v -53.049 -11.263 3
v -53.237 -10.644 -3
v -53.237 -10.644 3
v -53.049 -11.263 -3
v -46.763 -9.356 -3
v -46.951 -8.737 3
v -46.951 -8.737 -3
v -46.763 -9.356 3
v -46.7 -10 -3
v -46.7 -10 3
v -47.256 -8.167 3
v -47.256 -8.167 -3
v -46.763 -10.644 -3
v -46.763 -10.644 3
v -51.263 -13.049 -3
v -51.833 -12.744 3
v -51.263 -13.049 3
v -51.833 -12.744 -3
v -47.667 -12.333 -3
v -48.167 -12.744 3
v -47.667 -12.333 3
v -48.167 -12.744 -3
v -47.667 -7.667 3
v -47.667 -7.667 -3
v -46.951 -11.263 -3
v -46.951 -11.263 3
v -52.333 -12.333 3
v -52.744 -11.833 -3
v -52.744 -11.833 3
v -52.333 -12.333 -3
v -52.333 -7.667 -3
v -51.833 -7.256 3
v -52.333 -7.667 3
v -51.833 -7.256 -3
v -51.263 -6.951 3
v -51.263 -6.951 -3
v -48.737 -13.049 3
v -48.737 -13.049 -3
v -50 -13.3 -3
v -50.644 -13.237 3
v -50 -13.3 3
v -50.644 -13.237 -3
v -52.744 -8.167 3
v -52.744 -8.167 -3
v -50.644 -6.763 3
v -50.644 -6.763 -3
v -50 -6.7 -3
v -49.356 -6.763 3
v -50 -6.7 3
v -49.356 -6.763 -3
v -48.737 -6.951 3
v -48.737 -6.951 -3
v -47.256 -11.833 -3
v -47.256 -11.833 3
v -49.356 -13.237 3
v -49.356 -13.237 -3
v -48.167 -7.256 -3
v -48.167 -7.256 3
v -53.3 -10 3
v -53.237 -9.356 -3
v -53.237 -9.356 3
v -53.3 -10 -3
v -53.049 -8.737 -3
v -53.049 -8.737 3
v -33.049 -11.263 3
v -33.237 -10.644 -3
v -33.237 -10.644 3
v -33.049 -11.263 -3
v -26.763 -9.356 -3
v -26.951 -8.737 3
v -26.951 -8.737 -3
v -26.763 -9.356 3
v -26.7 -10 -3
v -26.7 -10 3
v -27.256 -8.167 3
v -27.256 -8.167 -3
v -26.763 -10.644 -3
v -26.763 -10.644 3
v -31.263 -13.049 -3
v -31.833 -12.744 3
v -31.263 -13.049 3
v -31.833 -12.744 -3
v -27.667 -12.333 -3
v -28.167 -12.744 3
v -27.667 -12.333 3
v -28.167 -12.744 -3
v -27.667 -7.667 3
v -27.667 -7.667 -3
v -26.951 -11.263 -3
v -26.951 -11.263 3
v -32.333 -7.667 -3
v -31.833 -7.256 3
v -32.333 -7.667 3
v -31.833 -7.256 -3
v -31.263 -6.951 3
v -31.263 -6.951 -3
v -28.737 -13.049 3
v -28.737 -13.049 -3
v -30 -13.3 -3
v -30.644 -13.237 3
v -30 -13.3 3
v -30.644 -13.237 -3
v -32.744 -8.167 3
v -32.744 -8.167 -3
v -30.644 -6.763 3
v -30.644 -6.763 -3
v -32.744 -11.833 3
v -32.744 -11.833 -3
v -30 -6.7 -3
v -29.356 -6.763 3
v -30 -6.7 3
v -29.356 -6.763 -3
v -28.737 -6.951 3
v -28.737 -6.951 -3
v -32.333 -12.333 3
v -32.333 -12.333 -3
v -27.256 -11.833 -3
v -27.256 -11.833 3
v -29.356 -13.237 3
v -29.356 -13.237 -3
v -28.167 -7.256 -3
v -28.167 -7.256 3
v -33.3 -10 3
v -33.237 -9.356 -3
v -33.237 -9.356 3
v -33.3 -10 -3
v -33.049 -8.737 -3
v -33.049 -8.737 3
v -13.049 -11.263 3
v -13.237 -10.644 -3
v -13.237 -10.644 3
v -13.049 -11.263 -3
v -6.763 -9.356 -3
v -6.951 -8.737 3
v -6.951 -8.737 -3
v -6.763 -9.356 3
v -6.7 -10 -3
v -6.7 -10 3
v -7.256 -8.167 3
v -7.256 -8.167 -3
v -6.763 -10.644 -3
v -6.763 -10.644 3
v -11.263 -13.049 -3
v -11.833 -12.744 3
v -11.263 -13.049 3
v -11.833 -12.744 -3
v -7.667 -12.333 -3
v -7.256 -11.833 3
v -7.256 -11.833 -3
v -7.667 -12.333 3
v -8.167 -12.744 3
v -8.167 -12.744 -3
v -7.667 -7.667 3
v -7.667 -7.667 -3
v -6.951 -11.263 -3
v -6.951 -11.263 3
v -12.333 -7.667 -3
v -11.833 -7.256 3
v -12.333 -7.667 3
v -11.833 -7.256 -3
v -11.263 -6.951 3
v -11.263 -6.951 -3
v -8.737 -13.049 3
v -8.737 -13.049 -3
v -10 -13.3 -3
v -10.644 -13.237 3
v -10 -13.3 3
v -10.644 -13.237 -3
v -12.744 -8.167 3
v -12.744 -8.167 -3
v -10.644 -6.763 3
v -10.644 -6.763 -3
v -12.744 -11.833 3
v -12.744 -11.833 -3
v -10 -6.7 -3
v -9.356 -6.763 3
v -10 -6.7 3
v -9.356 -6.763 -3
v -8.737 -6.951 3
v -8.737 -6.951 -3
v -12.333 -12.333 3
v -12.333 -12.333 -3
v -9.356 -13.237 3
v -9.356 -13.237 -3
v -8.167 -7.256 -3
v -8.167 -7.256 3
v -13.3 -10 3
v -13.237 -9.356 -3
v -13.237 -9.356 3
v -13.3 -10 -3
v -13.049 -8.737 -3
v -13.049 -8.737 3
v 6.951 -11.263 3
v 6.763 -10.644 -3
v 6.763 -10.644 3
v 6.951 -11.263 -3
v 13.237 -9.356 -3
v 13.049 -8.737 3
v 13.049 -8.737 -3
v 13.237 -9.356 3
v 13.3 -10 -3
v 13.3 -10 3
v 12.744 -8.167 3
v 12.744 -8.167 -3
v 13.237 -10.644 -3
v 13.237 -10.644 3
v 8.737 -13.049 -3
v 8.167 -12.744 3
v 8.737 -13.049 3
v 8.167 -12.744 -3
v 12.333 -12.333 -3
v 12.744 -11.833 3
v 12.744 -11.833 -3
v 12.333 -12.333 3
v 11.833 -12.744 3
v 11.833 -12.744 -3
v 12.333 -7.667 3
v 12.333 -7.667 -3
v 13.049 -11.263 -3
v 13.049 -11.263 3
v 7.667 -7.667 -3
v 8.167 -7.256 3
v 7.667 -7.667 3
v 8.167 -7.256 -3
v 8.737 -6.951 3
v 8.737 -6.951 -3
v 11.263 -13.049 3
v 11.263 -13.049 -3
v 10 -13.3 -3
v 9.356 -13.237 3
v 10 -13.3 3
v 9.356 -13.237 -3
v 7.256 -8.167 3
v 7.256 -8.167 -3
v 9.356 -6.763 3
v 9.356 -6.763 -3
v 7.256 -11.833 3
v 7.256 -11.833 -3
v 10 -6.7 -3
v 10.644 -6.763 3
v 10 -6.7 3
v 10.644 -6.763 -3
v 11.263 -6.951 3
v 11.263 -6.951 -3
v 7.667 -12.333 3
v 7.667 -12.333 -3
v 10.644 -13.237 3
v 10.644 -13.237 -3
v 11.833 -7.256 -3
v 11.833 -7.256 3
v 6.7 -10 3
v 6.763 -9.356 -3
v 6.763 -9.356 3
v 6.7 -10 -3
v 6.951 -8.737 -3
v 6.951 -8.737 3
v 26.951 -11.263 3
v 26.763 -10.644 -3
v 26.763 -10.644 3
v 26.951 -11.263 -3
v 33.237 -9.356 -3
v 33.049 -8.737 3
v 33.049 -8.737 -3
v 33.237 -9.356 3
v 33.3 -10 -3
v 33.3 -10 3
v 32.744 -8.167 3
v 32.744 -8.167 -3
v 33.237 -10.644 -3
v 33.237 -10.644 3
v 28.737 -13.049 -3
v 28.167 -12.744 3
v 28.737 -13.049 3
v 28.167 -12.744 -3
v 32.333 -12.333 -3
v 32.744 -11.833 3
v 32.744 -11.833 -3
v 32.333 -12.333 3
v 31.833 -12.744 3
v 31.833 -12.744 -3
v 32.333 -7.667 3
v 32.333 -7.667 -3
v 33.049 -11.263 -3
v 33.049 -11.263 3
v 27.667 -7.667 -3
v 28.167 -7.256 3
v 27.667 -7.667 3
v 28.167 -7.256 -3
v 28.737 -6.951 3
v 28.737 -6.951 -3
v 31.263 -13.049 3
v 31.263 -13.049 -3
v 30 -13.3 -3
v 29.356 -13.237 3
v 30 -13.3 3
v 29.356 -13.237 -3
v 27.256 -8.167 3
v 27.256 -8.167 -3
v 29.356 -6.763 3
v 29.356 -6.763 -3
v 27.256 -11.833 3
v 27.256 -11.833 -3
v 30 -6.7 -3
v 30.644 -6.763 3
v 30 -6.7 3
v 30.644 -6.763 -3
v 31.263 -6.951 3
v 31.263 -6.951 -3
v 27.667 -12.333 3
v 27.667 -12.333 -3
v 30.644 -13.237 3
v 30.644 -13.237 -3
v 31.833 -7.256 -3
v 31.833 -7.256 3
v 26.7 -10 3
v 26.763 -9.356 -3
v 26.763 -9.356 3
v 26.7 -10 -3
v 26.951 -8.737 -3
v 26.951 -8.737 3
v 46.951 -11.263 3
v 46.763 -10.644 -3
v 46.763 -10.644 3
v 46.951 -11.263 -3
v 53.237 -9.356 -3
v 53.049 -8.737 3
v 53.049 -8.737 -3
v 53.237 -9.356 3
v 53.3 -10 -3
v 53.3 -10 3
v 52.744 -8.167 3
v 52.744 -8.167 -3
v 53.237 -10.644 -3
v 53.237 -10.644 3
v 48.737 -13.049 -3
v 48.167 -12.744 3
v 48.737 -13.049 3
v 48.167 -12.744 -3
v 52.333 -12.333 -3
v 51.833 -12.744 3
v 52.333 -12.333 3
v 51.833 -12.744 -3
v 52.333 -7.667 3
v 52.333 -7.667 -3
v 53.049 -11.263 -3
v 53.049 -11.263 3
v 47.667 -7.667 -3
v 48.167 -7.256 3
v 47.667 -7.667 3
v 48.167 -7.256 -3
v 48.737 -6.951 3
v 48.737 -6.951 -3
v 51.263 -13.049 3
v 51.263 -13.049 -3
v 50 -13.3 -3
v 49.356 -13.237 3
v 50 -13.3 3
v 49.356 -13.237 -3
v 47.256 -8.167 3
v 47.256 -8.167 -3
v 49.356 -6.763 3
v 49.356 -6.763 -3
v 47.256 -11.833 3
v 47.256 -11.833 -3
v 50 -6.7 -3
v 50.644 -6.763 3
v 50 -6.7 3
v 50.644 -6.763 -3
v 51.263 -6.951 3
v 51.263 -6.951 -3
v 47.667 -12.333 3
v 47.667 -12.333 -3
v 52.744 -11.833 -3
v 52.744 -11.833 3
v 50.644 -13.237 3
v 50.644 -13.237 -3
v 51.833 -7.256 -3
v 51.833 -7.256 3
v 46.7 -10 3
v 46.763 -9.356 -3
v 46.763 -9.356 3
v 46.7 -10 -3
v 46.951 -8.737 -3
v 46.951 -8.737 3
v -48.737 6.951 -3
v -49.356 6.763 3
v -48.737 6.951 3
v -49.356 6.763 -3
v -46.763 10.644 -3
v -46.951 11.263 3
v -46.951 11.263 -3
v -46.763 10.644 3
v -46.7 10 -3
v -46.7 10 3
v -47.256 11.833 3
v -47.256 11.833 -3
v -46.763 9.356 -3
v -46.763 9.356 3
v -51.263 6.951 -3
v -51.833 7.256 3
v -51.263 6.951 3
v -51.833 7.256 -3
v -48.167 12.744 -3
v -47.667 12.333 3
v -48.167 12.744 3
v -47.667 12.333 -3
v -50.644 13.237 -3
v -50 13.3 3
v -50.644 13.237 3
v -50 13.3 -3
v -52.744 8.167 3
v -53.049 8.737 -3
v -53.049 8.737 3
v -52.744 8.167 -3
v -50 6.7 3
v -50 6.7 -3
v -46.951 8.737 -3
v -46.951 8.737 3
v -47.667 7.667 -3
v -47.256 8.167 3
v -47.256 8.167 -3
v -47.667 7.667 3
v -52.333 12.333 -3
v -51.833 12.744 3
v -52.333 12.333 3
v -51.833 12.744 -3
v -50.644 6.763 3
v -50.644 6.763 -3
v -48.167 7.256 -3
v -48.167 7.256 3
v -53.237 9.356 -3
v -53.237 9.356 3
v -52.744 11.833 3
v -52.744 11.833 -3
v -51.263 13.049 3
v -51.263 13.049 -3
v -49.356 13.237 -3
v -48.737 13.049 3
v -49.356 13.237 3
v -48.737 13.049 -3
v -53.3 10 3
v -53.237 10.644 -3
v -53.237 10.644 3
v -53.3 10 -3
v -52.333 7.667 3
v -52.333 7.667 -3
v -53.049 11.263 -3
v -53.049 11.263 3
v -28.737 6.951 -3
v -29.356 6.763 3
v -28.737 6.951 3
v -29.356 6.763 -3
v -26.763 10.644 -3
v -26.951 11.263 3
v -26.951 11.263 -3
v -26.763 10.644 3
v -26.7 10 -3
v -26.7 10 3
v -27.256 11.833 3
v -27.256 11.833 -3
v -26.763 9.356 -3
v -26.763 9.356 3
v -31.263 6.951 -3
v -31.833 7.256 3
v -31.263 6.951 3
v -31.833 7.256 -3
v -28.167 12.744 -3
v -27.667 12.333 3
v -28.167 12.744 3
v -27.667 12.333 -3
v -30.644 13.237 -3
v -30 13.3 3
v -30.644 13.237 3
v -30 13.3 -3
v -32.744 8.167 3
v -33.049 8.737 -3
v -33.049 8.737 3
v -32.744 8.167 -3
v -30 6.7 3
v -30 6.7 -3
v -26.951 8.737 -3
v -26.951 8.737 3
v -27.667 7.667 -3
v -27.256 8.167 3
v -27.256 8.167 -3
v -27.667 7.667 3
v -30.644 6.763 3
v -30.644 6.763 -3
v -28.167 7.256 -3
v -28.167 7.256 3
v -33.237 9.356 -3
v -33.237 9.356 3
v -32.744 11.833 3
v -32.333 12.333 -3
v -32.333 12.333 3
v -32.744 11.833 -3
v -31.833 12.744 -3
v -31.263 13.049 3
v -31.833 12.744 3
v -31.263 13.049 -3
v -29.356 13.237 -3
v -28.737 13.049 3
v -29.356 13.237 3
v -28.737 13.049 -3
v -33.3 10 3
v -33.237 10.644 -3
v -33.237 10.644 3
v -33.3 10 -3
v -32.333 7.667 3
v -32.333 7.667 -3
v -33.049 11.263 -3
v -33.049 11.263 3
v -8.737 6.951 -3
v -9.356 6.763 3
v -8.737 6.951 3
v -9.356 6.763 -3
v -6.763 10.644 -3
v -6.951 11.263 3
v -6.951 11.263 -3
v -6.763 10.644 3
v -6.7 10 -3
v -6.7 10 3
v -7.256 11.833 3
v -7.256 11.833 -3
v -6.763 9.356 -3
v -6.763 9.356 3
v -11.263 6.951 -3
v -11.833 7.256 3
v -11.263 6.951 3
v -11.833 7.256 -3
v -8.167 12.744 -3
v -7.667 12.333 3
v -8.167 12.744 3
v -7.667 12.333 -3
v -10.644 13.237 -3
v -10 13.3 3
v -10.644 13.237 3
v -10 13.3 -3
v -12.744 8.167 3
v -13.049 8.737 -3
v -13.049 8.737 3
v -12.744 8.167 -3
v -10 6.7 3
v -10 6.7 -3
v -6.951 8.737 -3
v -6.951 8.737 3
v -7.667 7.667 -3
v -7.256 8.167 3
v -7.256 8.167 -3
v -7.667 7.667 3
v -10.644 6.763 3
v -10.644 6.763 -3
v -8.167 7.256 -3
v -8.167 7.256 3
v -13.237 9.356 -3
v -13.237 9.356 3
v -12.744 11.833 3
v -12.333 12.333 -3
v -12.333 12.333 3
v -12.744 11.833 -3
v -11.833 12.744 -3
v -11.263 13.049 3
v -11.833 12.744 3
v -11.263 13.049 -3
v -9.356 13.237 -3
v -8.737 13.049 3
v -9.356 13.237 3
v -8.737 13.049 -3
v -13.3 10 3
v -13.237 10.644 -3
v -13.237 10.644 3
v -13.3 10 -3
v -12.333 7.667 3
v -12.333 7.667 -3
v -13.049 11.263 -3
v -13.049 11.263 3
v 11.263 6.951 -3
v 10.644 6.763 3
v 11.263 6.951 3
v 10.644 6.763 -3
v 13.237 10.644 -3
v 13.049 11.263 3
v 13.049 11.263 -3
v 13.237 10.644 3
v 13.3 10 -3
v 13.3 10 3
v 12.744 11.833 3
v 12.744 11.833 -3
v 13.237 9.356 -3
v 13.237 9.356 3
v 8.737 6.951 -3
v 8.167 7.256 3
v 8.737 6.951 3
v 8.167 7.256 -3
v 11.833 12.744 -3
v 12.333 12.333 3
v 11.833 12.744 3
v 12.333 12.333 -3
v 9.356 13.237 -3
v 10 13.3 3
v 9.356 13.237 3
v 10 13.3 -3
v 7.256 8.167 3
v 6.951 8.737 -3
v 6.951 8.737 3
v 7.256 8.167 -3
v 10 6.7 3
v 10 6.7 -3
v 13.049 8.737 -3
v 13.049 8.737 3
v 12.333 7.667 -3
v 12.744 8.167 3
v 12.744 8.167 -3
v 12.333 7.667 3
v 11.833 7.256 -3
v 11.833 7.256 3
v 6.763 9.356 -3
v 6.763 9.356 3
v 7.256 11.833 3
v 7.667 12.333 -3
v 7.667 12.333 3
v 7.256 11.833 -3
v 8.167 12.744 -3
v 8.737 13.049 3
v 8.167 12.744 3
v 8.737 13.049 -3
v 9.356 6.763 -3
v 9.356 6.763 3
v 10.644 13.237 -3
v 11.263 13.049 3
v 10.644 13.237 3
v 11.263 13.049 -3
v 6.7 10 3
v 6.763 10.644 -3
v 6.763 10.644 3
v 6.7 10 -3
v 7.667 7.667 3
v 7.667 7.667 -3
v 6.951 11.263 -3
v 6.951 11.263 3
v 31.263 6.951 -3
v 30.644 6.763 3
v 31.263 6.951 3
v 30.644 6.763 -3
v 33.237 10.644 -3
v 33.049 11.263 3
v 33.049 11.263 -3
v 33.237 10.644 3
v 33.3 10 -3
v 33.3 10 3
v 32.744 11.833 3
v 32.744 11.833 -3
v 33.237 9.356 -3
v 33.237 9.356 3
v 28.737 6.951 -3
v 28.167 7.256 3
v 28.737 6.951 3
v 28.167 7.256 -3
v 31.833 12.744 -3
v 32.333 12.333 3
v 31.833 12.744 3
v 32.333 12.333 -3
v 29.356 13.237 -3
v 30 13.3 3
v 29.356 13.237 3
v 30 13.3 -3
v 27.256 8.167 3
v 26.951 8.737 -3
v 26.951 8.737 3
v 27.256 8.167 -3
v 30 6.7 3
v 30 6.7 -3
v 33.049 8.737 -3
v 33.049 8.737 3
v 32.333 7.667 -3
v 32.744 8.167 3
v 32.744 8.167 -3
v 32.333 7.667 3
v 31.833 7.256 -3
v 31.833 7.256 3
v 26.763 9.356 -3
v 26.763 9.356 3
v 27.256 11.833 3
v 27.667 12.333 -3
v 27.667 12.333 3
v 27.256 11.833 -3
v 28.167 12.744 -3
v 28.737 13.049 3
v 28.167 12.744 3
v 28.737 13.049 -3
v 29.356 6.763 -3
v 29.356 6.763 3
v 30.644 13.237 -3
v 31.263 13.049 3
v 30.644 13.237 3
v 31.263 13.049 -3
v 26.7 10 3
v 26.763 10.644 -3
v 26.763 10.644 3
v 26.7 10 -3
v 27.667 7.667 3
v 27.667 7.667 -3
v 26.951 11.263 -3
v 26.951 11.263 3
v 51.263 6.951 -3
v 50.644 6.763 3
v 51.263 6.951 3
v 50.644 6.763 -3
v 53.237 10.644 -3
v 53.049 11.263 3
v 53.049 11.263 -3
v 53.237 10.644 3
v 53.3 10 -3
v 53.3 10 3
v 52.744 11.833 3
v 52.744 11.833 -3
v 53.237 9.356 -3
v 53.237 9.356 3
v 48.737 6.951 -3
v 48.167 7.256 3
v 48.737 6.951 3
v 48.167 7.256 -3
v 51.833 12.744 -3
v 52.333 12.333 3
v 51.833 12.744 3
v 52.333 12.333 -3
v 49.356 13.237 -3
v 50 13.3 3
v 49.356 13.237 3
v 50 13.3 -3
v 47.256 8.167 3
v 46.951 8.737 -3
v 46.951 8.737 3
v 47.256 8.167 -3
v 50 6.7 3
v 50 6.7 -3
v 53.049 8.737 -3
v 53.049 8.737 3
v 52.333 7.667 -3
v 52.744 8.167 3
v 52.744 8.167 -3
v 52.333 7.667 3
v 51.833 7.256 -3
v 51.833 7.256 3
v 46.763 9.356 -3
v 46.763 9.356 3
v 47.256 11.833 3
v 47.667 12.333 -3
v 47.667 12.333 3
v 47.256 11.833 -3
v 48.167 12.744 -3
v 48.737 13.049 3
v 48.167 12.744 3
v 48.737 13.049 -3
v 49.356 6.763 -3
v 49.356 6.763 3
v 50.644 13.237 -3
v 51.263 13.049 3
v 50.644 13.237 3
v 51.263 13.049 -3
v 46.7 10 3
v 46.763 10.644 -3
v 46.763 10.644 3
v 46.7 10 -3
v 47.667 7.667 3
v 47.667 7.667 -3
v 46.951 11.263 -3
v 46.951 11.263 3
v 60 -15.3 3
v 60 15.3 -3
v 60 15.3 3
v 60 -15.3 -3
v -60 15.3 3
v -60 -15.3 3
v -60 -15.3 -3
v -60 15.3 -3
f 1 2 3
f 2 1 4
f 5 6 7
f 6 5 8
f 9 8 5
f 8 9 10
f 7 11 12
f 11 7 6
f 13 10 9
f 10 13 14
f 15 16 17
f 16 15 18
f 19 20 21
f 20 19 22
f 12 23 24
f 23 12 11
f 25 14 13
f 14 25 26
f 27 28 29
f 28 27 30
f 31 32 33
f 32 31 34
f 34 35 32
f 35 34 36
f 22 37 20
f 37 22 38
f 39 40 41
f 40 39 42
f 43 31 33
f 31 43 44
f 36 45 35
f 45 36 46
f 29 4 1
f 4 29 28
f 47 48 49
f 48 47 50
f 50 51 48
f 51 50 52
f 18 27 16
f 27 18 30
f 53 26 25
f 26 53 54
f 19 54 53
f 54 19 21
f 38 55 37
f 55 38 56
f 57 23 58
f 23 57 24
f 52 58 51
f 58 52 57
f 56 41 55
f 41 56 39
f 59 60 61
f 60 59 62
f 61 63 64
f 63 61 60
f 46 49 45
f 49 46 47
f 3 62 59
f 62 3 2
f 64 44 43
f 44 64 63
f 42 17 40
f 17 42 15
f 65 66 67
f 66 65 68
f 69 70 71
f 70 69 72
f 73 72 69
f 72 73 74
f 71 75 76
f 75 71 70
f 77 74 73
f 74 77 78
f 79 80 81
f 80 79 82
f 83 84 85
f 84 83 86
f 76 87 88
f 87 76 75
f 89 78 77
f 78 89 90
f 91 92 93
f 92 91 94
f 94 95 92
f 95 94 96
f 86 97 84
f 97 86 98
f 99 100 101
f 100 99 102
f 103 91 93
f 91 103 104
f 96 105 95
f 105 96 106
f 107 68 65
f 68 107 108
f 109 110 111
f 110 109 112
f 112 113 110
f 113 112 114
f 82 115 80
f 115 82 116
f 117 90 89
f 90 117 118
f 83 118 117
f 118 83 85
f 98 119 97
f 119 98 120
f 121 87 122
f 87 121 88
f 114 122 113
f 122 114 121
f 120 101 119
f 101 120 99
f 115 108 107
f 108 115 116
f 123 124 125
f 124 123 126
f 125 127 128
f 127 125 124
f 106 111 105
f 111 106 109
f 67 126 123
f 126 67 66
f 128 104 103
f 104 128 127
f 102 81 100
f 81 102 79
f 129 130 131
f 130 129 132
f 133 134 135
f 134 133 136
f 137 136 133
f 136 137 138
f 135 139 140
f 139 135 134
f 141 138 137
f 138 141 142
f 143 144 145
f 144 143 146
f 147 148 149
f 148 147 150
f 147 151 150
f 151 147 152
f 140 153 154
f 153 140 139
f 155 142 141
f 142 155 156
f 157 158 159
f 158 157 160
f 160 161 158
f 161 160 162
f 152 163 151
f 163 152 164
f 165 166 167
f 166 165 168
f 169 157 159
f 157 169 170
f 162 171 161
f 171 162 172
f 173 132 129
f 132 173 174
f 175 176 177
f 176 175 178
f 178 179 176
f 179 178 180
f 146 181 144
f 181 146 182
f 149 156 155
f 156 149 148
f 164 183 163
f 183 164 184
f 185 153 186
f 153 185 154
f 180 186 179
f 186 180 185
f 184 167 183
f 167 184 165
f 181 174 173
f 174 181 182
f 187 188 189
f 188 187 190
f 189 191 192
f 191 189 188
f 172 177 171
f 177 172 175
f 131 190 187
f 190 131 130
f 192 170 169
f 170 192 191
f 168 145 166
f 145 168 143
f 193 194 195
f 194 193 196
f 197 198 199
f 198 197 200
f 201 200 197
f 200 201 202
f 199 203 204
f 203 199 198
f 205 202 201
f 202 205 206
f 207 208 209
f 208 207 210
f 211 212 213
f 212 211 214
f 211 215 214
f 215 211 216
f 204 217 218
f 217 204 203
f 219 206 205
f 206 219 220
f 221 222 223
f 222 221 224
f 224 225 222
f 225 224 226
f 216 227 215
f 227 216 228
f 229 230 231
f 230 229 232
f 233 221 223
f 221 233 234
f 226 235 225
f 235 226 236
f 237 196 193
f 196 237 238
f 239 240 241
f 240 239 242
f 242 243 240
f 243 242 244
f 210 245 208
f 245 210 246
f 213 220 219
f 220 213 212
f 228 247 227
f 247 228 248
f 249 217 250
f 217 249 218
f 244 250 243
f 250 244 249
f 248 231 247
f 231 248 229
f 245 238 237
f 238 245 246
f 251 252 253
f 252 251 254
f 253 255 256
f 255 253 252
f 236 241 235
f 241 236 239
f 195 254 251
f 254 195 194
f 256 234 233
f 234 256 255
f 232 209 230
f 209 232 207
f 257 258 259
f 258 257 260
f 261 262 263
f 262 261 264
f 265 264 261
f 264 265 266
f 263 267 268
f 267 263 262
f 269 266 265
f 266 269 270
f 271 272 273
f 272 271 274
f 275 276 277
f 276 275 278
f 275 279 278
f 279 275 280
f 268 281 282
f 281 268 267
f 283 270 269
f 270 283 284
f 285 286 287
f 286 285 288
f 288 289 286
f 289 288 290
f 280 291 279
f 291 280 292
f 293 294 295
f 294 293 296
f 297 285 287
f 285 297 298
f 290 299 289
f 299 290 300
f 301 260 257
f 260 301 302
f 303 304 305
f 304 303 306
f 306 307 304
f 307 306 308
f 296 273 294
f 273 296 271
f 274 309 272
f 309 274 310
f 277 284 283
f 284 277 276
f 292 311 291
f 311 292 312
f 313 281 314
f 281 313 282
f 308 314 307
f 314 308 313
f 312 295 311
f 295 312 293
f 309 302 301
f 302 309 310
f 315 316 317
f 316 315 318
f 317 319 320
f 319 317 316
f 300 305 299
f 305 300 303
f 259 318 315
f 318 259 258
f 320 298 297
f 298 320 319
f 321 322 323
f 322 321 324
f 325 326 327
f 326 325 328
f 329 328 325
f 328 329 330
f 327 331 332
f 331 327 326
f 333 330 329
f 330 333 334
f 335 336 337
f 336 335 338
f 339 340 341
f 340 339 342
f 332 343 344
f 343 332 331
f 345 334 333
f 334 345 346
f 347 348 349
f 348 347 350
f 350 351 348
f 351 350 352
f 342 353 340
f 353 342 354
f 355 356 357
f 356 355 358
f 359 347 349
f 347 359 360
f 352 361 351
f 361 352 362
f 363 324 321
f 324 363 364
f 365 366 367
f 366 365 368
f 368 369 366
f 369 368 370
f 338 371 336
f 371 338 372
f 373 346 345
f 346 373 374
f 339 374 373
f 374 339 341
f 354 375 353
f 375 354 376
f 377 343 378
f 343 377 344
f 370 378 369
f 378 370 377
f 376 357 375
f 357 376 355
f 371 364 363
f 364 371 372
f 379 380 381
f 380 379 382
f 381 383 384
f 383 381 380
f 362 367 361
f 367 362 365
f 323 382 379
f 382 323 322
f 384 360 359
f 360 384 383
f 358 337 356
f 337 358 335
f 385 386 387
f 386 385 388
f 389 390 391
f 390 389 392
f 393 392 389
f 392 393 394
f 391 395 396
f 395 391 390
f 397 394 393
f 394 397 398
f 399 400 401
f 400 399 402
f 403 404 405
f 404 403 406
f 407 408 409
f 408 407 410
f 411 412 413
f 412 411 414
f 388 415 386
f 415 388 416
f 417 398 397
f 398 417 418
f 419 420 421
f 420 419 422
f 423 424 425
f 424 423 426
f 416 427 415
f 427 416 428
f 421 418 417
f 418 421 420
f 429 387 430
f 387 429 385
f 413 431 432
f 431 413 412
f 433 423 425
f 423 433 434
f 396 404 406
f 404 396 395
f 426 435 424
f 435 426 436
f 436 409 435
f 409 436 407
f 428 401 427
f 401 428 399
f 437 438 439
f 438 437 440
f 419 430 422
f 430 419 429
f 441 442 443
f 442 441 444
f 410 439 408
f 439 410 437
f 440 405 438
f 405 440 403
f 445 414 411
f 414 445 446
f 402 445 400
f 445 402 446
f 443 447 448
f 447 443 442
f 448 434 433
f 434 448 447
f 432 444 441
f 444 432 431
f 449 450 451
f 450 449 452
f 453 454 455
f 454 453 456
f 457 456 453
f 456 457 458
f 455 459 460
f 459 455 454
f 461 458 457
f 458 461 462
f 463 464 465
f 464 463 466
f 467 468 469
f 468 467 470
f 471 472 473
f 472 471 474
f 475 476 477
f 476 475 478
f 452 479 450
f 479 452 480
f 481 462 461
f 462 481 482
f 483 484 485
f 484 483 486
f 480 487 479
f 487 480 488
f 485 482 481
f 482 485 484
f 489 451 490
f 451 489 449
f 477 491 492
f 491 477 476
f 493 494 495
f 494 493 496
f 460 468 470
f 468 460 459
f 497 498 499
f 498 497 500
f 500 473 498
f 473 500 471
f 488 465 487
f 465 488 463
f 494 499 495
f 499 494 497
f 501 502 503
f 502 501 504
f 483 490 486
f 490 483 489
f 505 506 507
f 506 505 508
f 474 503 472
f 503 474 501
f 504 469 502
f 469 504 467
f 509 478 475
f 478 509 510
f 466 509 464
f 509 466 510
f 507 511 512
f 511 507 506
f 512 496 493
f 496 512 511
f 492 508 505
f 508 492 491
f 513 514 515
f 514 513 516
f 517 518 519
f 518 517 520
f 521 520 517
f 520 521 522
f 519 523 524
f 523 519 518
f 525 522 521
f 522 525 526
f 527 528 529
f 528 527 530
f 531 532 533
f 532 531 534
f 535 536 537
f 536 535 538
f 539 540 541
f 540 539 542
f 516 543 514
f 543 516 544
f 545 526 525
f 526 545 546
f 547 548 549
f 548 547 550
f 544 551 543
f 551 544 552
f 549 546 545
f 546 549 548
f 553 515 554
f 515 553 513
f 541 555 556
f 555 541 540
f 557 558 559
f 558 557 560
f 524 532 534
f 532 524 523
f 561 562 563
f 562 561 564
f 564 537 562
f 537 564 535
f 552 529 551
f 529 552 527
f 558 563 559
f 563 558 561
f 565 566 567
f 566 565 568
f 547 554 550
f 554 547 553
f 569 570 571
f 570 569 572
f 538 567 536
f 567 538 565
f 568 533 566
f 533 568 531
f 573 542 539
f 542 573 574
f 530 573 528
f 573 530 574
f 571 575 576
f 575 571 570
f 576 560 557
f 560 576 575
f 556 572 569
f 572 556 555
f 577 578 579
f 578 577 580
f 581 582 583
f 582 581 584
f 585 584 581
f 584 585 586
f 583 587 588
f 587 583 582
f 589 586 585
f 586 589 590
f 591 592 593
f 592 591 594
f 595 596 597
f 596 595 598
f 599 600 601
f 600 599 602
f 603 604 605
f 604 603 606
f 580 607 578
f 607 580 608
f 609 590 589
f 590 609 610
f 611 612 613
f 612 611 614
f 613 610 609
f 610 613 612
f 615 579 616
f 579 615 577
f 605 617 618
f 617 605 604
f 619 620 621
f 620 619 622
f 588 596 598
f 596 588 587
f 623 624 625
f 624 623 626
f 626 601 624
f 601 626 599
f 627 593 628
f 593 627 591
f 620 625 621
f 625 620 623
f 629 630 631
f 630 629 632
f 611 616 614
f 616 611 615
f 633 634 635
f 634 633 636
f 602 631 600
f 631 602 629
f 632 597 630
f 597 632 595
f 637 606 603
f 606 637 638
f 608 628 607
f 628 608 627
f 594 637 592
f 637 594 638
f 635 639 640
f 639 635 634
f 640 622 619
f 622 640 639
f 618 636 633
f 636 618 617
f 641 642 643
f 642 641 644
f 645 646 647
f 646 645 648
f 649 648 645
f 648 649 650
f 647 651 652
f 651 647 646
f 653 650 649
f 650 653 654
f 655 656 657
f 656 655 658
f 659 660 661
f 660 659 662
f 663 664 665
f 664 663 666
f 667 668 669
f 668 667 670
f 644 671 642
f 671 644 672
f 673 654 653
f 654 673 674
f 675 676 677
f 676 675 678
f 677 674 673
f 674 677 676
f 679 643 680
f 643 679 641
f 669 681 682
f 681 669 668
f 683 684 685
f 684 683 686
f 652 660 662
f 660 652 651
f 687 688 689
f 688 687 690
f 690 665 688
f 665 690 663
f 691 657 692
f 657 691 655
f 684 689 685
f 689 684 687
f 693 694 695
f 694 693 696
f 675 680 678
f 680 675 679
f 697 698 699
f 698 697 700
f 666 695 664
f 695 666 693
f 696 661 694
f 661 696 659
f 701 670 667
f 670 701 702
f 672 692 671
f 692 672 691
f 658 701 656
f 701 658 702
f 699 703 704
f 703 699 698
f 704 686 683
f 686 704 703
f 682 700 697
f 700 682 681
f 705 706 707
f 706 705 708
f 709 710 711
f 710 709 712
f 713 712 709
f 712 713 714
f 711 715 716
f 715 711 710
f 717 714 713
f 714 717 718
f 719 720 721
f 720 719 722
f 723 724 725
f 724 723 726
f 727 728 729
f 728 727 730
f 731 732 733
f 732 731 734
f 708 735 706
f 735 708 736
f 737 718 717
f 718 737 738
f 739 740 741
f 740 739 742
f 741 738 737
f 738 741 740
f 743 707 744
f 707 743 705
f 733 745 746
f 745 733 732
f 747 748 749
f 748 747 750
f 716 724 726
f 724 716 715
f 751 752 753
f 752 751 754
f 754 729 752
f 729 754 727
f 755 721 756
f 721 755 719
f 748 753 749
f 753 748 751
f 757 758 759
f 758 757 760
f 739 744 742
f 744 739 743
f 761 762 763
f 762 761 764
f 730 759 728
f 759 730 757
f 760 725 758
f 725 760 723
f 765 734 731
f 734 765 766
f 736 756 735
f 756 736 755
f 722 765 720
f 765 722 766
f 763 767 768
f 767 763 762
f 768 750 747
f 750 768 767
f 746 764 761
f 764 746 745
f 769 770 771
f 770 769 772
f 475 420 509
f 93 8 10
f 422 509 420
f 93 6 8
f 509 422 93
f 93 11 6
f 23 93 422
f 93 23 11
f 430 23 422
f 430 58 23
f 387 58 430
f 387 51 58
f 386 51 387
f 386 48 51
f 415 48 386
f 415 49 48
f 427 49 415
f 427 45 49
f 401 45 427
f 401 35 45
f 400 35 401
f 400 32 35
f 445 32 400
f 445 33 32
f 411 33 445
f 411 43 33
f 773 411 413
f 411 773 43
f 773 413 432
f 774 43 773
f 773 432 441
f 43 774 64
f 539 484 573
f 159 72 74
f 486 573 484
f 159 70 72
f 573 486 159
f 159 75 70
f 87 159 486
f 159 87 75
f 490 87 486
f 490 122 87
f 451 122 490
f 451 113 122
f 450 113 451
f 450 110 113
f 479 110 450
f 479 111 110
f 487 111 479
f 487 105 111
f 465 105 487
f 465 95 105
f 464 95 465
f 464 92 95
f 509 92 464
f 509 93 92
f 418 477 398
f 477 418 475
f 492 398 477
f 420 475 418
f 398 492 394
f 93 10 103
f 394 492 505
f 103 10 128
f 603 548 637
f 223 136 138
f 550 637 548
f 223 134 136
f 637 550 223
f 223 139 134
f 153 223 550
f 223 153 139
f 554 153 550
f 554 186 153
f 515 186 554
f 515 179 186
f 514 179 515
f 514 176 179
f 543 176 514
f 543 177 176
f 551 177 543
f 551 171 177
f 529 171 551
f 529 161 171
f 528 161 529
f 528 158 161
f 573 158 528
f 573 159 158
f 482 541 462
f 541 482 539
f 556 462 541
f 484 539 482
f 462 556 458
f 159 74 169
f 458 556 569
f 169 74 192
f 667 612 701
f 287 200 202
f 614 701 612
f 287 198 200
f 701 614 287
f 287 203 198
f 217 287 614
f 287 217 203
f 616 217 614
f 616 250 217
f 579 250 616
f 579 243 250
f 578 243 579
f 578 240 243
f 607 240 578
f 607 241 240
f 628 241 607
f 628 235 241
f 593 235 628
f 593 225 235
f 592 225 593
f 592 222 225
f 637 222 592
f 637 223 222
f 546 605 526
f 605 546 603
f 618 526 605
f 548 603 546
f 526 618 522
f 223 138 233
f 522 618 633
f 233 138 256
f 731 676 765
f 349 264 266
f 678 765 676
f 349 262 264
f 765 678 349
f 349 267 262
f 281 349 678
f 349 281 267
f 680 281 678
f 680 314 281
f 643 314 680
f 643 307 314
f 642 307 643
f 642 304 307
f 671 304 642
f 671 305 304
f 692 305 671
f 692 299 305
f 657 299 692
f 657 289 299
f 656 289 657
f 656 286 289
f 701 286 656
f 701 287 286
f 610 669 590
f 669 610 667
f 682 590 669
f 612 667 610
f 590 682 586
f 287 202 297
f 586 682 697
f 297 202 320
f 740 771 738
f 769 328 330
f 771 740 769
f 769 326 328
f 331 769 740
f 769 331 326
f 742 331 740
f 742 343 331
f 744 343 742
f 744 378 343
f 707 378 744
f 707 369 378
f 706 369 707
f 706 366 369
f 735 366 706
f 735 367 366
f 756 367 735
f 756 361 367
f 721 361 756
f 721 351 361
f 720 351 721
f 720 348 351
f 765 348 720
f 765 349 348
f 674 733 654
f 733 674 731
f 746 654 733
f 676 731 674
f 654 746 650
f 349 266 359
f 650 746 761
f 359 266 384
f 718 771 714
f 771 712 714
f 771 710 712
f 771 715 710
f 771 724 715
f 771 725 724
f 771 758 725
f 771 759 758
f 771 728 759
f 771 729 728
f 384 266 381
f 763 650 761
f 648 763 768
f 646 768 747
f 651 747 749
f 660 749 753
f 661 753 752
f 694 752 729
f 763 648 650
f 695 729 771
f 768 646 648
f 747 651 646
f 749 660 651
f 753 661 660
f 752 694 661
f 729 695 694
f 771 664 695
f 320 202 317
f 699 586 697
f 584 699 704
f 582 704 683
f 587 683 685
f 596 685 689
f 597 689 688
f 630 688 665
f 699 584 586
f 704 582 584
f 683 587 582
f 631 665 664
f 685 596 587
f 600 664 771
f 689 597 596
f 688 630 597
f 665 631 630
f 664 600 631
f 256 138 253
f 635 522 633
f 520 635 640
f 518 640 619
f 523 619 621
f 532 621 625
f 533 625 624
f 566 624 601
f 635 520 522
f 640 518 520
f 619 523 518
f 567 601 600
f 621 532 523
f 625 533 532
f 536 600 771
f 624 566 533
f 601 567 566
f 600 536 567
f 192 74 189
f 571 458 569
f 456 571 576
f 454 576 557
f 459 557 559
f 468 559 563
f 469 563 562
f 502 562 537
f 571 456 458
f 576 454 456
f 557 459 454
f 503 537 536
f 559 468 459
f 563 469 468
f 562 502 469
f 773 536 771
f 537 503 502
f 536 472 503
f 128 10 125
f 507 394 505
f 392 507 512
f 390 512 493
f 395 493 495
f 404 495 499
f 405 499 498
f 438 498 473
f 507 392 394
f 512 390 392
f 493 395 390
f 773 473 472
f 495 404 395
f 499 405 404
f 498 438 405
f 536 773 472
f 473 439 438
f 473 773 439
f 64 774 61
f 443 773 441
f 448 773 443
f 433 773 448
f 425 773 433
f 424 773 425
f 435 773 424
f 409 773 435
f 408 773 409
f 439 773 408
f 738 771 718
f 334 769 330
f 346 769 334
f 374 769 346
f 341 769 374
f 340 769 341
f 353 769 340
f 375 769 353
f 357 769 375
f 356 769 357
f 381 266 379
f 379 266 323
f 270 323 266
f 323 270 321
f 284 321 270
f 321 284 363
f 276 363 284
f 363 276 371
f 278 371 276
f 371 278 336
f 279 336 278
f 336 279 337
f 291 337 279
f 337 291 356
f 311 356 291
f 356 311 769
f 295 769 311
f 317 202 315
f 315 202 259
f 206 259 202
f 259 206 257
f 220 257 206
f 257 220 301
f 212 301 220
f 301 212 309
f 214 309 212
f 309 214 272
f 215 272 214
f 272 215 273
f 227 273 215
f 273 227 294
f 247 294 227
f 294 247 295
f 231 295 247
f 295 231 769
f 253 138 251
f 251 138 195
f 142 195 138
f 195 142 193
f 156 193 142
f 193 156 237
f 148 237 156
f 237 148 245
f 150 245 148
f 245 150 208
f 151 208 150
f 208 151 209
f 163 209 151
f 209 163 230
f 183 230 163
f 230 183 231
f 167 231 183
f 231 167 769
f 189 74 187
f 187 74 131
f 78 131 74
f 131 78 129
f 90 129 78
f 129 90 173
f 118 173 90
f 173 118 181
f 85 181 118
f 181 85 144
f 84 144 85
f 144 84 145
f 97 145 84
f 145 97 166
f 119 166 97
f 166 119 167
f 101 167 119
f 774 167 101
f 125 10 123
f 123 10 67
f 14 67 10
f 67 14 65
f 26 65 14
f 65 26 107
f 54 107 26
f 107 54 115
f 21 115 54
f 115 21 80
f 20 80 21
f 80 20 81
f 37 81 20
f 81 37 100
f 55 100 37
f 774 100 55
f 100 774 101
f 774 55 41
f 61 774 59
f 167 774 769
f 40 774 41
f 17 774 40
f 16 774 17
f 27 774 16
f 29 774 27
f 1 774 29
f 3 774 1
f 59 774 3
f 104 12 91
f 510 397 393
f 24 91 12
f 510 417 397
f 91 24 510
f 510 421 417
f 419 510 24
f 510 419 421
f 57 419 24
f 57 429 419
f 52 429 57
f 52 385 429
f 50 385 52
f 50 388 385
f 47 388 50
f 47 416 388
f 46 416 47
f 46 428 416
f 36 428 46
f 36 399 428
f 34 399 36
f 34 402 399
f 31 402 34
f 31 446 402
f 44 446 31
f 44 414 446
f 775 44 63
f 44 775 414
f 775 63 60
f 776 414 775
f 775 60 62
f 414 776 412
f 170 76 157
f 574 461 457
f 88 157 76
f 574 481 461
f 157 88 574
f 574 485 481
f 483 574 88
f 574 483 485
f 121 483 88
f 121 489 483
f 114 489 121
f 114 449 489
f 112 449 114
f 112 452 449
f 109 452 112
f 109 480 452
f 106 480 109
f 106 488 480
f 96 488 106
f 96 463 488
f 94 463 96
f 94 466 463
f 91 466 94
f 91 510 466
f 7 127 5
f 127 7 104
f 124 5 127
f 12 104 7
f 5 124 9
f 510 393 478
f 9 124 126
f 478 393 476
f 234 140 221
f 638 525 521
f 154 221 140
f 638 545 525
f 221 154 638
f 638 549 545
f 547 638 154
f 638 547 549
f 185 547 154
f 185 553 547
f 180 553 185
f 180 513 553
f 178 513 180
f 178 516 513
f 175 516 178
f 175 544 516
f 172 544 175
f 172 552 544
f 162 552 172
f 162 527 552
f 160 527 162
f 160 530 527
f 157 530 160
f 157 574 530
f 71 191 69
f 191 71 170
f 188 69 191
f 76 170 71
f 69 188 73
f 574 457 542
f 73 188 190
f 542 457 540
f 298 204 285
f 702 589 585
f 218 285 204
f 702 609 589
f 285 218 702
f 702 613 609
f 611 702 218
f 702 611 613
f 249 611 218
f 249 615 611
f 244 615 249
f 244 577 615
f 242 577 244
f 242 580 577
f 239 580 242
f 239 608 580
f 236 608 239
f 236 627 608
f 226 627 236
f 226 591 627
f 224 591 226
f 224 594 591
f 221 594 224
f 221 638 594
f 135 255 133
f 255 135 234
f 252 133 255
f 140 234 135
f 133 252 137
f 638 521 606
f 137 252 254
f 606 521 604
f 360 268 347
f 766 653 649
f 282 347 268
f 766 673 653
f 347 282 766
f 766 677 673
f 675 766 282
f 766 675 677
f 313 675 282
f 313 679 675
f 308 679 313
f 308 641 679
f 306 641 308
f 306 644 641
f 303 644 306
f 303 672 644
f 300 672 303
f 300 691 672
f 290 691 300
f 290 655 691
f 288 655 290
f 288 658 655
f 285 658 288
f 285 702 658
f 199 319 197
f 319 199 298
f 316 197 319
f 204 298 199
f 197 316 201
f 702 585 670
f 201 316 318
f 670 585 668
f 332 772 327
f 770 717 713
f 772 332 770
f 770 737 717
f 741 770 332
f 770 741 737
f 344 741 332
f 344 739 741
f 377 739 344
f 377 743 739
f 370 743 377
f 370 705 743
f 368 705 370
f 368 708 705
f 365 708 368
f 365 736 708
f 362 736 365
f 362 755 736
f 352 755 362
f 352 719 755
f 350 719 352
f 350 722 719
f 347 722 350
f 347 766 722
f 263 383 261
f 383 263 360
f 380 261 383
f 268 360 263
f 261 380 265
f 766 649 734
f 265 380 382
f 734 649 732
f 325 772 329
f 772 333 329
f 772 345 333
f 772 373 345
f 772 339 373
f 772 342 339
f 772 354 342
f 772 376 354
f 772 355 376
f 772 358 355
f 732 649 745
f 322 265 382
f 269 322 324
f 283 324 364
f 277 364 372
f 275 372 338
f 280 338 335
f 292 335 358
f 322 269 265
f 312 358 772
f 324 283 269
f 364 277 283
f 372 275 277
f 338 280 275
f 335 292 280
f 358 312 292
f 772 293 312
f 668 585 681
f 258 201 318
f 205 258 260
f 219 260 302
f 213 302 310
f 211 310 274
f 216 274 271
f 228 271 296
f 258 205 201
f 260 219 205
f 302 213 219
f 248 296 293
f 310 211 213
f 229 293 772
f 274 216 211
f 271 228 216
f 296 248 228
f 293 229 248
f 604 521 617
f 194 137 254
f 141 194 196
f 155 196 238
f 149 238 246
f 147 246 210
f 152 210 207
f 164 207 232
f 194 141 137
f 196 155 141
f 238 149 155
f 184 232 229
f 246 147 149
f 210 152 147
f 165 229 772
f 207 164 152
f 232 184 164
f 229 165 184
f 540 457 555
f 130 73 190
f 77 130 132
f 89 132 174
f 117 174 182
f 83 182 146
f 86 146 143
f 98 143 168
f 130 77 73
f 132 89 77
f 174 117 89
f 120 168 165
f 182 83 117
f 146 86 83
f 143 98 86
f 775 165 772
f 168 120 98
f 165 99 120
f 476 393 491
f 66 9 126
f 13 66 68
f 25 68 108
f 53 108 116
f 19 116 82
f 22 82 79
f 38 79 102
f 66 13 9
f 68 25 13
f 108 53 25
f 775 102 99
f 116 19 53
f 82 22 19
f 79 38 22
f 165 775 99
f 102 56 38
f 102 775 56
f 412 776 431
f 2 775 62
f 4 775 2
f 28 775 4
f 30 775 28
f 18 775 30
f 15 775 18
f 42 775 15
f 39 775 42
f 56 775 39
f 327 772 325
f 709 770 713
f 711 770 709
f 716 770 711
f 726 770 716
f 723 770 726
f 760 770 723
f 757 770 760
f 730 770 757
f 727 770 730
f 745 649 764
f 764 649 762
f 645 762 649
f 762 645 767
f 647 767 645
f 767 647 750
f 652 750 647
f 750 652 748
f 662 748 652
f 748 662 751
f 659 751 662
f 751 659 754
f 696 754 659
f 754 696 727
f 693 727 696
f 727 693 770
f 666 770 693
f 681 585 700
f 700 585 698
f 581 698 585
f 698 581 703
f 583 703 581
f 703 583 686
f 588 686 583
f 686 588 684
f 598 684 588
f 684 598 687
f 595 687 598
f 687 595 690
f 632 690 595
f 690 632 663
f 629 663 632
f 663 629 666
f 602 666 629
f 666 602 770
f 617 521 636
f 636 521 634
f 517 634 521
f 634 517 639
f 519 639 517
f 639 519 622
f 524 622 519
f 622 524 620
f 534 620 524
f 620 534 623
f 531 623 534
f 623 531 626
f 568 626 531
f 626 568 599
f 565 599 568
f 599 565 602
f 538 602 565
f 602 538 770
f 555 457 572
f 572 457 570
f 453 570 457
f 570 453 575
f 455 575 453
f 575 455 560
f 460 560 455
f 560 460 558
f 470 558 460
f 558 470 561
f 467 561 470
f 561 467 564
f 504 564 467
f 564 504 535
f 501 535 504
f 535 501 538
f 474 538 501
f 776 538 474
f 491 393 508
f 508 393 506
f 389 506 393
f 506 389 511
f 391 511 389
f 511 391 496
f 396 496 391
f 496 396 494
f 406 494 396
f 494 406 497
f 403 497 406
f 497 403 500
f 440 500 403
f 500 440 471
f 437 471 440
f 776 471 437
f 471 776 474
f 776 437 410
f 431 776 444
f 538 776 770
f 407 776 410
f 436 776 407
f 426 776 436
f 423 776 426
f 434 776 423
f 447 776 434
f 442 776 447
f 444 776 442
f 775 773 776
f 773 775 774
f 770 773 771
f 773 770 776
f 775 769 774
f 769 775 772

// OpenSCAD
$fn = 32;

// ----------------------------------------------------------------------
// Hole bar, 6 x Ø6.6
// tworows layout, 10 mm edge offset
// ----------------------------------------------------------------------

// --- parameters (mm) ---
bar_w = 30.6;     // bar width (Y)
bar_t = 6;        // bar thickness (Z)
holes = 6;        // holes per row
hole_d = 6.6;     // hole diameter
edge = 10;        // offset from the bar end to the first hole
pitch = 20;       // pitch between neighbouring holes
row_offset = 20;  // distance between the two rows

// --- derived feature positions (mm) ---
span = (holes - 1) * pitch;   // = 100   distance between the end holes
bar_l = span + 2 * edge;      // = 120   overall bar length
start_x = -bar_l / 2 + edge;  // = -50   X of the first hole
feature_centers = [
  [start_x + 0 * pitch, -row_offset / 2],
  [start_x + 1 * pitch, -row_offset / 2],
  [start_x + 2 * pitch, -row_offset / 2],
  [start_x + 3 * pitch, -row_offset / 2],
  [start_x + 4 * pitch, -row_offset / 2],
  [start_x + 5 * pitch, -row_offset / 2]
];   // hole centres of the first row
row2_centers = [
  [start_x + 0 * pitch, row_offset / 2],
  [start_x + 1 * pitch, row_offset / 2],
  [start_x + 2 * pitch, row_offset / 2],
  [start_x + 3 * pitch, row_offset / 2],
  [start_x + 4 * pitch, row_offset / 2],
  [start_x + 5 * pitch, row_offset / 2]
];   // hole centres of the second row

// bar with two rows of holes, both read from their own centre arrays
difference() {
  translate([-bar_l / 2, -bar_w / 2, -bar_t / 2]) cube([bar_l, bar_w, bar_t]);
  for (centre = feature_centers)
    translate([centre[0], centre[1], 0])
      cylinder(d = hole_d, h = bar_t + 2, center = true);
  for (centre = row2_centers)
    translate([centre[0], centre[1], 0])
      cylinder(d = hole_d, h = bar_t + 2, center = true);
}
